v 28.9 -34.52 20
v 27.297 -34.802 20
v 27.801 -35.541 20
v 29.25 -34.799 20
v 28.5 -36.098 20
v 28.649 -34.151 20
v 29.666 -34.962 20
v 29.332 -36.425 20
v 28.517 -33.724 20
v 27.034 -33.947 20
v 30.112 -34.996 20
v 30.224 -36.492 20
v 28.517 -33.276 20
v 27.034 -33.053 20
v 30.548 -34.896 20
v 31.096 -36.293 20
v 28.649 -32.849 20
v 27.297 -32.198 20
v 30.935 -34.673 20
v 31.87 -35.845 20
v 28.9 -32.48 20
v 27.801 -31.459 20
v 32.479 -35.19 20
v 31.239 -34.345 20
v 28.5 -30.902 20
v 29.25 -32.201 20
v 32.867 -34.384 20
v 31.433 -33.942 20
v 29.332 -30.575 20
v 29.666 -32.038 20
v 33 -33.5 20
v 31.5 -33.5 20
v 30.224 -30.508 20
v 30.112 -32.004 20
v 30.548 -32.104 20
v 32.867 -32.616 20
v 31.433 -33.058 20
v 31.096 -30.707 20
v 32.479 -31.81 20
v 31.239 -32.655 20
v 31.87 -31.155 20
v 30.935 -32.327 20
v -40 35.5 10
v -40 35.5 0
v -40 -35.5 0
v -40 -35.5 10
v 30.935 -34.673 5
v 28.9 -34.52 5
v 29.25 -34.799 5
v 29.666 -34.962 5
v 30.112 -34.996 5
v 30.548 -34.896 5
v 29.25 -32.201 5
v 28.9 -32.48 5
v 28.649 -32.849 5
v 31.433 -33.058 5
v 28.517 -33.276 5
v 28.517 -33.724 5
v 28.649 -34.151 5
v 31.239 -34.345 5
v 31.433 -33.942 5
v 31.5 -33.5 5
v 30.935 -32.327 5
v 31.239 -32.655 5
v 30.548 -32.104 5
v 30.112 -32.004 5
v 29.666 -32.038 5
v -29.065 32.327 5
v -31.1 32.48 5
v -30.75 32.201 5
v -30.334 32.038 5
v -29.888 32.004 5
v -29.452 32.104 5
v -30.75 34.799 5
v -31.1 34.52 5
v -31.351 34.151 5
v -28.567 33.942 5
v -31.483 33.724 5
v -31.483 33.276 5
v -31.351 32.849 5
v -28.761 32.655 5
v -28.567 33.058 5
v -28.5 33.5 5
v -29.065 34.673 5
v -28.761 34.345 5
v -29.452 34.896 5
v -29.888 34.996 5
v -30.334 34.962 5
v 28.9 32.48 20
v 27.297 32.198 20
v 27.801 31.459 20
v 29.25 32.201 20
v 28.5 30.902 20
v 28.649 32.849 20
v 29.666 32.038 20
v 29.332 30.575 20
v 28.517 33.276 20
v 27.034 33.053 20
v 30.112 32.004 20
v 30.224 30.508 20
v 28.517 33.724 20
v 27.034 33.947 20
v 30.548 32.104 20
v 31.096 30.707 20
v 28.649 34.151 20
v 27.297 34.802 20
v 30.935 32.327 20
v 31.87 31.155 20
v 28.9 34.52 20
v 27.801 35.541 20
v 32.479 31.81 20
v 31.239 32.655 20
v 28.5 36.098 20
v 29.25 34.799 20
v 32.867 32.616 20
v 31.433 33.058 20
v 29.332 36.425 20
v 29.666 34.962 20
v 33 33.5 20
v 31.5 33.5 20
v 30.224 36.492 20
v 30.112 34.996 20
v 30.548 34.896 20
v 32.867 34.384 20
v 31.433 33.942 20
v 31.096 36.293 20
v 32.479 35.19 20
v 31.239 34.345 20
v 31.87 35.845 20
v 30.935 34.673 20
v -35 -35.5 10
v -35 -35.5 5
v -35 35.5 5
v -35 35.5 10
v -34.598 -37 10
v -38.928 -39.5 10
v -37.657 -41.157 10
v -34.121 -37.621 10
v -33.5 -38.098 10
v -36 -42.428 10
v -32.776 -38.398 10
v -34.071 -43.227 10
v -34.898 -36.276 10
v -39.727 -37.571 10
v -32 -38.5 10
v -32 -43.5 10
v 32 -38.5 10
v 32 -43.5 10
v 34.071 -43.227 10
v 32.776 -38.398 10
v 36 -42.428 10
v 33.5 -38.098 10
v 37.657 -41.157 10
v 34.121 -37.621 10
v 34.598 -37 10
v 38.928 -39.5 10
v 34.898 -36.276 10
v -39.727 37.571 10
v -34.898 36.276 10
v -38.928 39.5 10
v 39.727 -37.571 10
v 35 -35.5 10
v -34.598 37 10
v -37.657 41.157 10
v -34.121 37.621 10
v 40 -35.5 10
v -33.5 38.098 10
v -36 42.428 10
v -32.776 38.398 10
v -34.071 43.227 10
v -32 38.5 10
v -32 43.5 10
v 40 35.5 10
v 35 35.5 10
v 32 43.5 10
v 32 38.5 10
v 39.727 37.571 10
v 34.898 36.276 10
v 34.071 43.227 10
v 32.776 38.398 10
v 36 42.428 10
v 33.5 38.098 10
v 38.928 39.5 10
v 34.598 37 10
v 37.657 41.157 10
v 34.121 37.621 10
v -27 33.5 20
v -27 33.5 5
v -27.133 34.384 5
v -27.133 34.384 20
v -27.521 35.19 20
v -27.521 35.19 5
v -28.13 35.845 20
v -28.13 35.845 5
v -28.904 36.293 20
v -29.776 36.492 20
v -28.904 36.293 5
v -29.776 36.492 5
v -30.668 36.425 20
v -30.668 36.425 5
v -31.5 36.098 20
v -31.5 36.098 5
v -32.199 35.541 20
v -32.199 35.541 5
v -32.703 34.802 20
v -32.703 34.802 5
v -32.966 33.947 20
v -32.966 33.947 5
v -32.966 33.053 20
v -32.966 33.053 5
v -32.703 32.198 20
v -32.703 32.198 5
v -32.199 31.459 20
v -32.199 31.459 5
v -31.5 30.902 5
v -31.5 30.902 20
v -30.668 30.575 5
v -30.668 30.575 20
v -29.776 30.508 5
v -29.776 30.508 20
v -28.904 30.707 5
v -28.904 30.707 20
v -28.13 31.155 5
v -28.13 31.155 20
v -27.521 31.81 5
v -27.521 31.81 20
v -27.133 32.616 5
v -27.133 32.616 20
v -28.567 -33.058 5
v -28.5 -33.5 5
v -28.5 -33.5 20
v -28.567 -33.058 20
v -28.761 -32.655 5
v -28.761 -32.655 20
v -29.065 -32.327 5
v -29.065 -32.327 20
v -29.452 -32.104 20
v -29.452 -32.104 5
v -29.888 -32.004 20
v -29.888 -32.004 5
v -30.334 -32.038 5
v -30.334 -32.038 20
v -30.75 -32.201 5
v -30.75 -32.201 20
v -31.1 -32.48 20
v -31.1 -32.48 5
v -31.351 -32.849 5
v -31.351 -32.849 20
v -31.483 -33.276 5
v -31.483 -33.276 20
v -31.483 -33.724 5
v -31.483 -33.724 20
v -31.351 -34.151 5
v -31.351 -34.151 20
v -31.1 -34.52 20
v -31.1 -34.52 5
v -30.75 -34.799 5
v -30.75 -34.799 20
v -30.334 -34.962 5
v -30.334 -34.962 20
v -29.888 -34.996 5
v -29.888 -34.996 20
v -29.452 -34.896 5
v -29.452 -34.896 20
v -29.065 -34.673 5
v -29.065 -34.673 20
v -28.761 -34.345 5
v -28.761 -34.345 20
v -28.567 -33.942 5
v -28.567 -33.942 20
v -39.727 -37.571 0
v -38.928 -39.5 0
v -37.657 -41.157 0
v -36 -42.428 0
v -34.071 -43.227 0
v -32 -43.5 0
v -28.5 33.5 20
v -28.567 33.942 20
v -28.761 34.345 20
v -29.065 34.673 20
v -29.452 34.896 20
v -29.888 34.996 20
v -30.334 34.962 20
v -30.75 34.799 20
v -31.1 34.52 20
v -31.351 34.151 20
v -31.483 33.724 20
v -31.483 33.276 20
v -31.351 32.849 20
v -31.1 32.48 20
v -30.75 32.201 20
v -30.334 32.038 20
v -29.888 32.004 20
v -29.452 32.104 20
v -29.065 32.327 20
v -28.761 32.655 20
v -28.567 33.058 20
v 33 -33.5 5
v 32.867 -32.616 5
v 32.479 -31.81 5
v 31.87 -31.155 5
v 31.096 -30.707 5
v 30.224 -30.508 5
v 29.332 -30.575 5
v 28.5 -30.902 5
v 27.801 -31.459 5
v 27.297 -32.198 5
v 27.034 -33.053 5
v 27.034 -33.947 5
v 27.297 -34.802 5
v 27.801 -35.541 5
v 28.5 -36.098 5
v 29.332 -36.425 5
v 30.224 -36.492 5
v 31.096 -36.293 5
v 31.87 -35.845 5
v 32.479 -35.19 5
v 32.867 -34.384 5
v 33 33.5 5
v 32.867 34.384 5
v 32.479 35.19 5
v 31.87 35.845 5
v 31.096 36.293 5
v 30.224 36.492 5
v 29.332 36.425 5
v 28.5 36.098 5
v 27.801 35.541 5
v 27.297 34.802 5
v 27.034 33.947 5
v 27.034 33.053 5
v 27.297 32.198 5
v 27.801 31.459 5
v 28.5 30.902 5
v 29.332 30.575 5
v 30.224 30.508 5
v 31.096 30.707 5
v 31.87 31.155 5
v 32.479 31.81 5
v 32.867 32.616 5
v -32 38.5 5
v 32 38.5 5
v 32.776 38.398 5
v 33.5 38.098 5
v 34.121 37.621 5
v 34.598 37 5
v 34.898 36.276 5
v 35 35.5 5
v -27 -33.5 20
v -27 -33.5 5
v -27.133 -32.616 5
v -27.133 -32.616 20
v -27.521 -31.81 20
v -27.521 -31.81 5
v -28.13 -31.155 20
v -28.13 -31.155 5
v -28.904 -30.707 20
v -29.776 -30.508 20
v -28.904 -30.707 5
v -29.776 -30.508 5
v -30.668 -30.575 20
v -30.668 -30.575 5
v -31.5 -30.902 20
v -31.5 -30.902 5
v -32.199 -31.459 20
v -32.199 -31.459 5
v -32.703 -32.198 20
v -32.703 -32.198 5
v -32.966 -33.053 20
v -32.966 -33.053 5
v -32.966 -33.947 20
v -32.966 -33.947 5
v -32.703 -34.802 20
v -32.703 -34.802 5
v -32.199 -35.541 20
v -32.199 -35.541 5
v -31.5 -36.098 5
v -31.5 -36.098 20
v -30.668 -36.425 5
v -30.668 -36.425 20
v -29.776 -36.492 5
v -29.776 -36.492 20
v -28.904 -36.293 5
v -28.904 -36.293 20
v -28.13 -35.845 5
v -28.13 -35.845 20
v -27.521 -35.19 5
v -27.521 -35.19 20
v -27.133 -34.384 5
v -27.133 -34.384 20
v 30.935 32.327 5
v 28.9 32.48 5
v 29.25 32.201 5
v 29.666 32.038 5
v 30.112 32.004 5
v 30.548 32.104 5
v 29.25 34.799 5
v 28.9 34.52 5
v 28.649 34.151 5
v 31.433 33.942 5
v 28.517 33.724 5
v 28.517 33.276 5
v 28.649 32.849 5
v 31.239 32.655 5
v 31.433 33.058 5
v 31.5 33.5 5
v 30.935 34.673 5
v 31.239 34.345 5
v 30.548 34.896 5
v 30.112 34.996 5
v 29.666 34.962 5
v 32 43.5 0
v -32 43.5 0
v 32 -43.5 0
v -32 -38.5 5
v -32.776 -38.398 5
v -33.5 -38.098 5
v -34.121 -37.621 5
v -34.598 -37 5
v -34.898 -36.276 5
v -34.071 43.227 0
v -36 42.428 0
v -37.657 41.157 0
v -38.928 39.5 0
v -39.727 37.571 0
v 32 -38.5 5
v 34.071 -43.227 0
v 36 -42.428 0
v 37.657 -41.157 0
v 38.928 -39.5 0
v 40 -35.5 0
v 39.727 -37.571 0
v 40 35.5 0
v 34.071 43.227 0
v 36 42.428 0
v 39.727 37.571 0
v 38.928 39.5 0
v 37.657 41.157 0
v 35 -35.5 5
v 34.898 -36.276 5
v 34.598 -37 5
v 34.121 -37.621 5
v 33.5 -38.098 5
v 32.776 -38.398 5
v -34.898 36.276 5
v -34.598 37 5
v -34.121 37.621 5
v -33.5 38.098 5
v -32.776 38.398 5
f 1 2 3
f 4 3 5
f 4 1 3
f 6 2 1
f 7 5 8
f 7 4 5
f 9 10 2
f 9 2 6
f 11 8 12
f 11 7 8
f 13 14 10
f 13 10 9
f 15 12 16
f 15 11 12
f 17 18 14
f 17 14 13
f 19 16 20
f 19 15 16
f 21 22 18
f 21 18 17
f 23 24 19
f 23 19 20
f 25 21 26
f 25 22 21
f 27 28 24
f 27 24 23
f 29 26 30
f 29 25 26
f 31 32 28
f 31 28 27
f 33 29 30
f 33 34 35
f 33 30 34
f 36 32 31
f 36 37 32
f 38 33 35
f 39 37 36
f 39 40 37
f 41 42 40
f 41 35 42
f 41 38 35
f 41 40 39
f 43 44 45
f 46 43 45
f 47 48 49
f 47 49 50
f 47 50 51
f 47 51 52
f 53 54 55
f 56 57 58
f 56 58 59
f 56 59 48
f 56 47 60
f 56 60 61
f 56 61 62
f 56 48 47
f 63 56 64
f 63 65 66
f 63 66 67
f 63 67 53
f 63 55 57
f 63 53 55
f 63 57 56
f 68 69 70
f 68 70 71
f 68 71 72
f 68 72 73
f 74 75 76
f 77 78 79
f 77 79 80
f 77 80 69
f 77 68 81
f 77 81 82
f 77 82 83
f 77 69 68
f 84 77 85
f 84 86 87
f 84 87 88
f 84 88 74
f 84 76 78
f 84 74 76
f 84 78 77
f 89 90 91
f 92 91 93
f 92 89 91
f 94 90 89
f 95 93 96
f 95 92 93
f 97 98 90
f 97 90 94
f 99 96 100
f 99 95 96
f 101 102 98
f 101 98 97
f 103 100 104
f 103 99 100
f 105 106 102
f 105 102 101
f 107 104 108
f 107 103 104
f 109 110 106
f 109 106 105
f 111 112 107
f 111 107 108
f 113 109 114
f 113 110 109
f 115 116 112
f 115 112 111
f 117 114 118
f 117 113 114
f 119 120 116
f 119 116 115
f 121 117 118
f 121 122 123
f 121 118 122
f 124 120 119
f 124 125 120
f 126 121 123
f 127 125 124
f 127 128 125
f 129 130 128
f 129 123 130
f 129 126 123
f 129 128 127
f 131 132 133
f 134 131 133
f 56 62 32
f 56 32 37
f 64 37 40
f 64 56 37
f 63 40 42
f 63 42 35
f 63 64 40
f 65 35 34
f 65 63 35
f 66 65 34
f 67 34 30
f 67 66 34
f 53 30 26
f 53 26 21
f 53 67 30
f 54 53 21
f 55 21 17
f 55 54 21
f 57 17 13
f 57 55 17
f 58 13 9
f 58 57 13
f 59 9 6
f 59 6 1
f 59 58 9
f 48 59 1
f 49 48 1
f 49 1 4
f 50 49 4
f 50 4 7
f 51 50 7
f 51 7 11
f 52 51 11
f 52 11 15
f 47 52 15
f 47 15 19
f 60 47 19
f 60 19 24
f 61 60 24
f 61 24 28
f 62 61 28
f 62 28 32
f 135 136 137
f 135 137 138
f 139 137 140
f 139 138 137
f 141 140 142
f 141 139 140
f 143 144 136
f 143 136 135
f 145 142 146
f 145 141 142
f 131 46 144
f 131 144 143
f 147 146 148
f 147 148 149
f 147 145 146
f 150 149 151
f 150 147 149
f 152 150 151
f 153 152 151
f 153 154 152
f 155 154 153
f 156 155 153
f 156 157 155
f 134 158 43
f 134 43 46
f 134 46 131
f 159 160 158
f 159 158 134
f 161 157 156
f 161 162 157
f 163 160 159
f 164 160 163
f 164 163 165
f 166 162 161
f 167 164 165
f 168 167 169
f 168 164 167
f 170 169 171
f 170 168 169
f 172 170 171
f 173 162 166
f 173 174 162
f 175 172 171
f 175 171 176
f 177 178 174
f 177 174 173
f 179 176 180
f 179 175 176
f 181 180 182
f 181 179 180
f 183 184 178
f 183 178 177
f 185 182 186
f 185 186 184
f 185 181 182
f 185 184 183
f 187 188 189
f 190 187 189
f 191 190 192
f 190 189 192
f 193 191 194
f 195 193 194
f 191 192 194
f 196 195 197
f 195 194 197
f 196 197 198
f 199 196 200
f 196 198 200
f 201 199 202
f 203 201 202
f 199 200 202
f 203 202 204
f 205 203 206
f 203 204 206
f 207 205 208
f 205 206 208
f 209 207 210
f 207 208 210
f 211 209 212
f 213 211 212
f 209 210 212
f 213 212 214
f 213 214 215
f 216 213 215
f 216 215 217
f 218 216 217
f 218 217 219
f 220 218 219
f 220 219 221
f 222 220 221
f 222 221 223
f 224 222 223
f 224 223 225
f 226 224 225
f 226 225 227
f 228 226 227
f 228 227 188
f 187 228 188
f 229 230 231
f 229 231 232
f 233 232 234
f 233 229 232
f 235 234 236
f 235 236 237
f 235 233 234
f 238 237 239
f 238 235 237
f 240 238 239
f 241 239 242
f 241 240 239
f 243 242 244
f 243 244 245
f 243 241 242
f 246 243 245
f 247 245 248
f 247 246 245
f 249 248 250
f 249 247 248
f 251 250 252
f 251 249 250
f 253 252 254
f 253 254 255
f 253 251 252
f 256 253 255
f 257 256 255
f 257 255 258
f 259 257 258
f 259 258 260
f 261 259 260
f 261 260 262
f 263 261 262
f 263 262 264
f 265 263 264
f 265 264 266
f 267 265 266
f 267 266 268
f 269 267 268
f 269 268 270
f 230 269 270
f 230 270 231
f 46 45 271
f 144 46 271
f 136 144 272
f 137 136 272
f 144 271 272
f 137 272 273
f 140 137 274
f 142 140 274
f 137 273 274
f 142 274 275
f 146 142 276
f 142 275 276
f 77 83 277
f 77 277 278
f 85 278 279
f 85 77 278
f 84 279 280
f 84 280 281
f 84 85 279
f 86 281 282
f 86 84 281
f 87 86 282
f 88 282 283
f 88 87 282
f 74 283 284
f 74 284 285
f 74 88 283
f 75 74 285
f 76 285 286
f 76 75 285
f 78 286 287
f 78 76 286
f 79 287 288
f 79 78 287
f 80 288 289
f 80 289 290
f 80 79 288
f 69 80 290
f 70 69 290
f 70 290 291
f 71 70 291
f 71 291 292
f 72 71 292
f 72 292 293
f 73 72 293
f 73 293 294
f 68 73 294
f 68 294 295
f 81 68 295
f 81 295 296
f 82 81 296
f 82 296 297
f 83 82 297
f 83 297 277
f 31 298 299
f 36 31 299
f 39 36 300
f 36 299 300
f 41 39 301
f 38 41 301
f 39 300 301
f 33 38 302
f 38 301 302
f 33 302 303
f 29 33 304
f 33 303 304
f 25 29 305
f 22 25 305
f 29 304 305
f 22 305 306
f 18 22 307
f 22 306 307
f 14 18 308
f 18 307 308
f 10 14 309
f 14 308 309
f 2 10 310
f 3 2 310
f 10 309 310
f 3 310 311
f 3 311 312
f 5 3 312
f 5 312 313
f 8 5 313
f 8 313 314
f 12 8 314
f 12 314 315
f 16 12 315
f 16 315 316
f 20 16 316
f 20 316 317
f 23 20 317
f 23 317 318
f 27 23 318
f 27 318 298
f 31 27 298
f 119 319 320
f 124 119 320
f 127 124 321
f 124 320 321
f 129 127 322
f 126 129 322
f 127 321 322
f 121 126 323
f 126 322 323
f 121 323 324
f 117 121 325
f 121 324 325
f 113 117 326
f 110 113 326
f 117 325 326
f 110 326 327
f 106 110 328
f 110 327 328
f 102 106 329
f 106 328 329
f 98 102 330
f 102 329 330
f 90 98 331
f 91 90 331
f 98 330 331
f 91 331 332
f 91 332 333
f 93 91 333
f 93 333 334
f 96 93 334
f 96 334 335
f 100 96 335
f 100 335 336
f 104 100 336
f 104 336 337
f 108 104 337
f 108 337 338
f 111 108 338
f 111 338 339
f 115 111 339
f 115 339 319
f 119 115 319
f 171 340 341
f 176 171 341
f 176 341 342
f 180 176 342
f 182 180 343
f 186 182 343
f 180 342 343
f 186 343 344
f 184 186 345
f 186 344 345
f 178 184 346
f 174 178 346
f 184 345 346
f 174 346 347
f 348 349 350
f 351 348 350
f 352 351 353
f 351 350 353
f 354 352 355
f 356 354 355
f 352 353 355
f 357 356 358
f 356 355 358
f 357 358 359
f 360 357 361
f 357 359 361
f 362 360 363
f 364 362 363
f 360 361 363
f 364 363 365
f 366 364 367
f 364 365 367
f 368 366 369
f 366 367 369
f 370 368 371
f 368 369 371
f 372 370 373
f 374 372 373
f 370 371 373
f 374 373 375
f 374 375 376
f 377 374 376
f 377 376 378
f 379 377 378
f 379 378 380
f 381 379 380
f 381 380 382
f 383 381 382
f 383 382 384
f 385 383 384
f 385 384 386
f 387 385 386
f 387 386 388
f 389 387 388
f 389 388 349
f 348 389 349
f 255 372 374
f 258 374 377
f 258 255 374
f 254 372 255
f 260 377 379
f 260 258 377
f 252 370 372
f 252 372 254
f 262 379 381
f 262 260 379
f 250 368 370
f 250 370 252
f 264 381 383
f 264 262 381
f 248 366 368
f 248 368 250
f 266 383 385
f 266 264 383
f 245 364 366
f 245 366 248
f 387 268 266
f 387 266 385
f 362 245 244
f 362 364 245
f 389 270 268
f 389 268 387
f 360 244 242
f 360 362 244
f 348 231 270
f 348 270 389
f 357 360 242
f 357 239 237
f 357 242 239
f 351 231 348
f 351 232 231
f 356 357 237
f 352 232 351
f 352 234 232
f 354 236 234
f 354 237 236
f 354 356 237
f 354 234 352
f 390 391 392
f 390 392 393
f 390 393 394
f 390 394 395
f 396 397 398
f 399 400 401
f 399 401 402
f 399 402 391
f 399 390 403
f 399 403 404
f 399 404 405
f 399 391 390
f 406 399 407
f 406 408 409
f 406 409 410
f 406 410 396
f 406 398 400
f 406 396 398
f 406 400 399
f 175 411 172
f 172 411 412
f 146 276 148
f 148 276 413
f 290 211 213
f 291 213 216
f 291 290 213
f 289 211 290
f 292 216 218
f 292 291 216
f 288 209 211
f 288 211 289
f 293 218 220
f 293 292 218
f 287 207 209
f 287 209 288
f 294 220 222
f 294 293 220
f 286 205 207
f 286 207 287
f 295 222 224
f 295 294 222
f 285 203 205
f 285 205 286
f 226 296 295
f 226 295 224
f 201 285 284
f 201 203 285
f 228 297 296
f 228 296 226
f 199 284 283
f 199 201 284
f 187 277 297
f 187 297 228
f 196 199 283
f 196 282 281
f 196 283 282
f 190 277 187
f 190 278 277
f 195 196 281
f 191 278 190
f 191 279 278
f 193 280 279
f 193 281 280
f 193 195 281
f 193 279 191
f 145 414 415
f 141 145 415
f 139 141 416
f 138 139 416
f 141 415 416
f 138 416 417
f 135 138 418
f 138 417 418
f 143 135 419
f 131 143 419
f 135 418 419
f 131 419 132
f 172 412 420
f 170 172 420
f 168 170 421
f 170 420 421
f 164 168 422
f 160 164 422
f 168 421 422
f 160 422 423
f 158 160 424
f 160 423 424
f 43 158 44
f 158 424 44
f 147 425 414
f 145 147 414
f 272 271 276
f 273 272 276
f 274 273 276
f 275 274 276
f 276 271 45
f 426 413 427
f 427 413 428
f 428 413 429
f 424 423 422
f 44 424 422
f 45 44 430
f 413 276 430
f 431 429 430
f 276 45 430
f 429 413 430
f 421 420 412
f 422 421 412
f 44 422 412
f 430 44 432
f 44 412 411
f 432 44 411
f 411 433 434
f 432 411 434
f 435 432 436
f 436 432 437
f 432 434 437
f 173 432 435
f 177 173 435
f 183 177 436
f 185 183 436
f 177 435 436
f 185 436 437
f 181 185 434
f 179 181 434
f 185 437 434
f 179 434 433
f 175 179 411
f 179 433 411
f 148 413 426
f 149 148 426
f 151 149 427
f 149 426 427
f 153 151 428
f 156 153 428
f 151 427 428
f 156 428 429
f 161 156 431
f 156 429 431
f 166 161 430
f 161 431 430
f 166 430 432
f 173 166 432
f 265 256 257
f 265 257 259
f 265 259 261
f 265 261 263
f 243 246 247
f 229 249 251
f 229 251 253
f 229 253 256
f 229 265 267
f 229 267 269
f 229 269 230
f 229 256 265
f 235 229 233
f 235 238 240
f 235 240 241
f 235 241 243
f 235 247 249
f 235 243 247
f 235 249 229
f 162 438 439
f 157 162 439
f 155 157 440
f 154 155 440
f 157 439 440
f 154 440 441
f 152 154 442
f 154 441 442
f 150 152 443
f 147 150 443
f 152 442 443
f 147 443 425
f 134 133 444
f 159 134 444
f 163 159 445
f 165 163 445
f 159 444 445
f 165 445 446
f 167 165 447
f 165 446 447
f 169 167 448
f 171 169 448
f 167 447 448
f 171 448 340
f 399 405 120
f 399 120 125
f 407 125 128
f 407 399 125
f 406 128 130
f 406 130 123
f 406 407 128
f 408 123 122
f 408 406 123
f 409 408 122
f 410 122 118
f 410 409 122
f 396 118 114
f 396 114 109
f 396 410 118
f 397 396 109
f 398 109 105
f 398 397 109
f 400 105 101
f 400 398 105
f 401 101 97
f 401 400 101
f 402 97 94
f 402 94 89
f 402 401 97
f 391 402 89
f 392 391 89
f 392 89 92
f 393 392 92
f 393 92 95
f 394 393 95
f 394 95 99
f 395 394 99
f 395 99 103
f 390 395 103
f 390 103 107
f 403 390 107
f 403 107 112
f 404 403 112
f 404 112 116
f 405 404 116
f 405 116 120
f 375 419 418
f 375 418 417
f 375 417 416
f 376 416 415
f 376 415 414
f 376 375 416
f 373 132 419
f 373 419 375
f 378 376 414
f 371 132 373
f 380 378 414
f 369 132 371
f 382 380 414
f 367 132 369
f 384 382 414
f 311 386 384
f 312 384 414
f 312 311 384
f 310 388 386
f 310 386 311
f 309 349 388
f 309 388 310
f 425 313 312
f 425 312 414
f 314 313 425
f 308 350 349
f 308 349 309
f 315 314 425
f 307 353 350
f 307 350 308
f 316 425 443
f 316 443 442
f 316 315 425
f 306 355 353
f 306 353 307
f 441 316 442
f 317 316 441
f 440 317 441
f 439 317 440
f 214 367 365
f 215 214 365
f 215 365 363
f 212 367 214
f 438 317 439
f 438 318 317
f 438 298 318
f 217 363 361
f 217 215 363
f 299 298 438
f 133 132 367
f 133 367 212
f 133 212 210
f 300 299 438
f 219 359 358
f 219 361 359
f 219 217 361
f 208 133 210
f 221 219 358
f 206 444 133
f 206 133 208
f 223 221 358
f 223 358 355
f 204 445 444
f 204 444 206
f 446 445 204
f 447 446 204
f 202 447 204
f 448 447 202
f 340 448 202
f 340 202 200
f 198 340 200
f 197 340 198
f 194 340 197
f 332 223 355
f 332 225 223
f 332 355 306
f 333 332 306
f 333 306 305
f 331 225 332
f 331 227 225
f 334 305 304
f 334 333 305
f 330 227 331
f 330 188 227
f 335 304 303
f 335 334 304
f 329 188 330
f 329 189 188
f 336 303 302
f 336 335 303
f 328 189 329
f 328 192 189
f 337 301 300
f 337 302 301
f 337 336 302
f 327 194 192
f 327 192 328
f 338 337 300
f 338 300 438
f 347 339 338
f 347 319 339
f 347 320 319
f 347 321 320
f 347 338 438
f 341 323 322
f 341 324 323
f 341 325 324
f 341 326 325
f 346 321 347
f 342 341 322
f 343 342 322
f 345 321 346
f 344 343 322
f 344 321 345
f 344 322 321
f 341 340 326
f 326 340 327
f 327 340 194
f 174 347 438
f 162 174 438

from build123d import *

# Parameters (mm, degrees)
F1_DEPTH = 10
F0_R     = 3
F0_R_2   = 1.5
F2_DEPTH = 5
F3_DEPTH = 20


with BuildPart() as f1:
    # F0 (on Top) → F1 (new body)
    with BuildSketch(Plane.XY):
        with BuildLine():
            ThreePointArc((40, 35.5), (37.656854, 41.156854), (32, 43.5))
            Line((32, 43.5), (-32, 43.5))
            ThreePointArc((-32, 43.5), (-37.656854, 41.156854), (-40, 35.5))
            Line((-40, 35.5), (-40, -35.5))
            ThreePointArc((-40, -35.5), (-37.656854, -41.156854), (-32, -43.5))
            Line((-32, -43.5), (32, -43.5))
            ThreePointArc((32, -43.5), (37.656854, -41.156854), (40, -35.5))
            Line((40, -35.5), (40, 35.5))
        make_face()
        with BuildLine():
            Line((-32, 38.5), (32, 38.5))
            ThreePointArc((32, 38.5), (34.12132, 37.62132), (35, 35.5))
            Line((35, 35.5), (35, -35.5))
            ThreePointArc((35, -35.5), (34.12132, -37.62132), (32, -38.5))
            Line((32, -38.5), (-32, -38.5))
            ThreePointArc((-32, -38.5), (-34.12132, -37.62132), (-35, -35.5))
            Line((-35, -35.5), (-35, 35.5))
            ThreePointArc((-35, 35.5), (-34.12132, 37.62132), (-32, 38.5))
        make_face(mode=Mode.SUBTRACT)
    extrude(amount=F1_DEPTH)

    # F0 (on Top) → F2 (join)
    with BuildSketch(Plane.XY):
        with BuildLine():
            ThreePointArc((35, 35.5), (34.12132, 37.62132), (32, 38.5))
            Line((32, 38.5), (-32, 38.5))
            ThreePointArc((-32, 38.5), (-34.12132, 37.62132), (-35, 35.5))
            Line((-35, 35.5), (-35, -35.5))
            ThreePointArc((-35, -35.5), (-34.12132, -37.62132), (-32, -38.5))
            Line((-32, -38.5), (32, -38.5))
            ThreePointArc((32, -38.5), (34.12132, -37.62132), (35, -35.5))
            Line((35, -35.5), (35, 35.5))
        make_face()
        with Locations((-30, -33.5)):
            Circle(F0_R, mode=Mode.SUBTRACT)
        with Locations((30, -33.5)):
            Circle(F0_R, mode=Mode.SUBTRACT)
        with Locations((-30, 33.5)):
            Circle(F0_R, mode=Mode.SUBTRACT)
        with Locations((30, 33.5)):
            Circle(F0_R, mode=Mode.SUBTRACT)
        with Locations((-30, -33.5)):
            Circle(F0_R_2)
        with Locations((30, -33.5)):
            Circle(F0_R_2)
        with Locations((30, 33.5)):
            Circle(F0_R_2)
        with Locations((-30, 33.5)):
            Circle(F0_R_2)
    extrude(amount=F2_DEPTH)

    # F0 (on Top) → F3 (join)
    with BuildSketch(Plane.XY):
        with Locations((-30, 33.5)):
            Circle(F0_R)
        with Locations((-30, 33.5)):
            Circle(F0_R_2, mode=Mode.SUBTRACT)
        with Locations((30, 33.5)):
            Circle(F0_R)
        with Locations((30, 33.5)):
            Circle(F0_R_2, mode=Mode.SUBTRACT)
        with Locations((30, -33.5)):
            Circle(F0_R)
        with Locations((30, -33.5)):
            Circle(F0_R_2, mode=Mode.SUBTRACT)
        with Locations((-30, -33.5)):
            Circle(F0_R)
        with Locations((-30, -33.5)):
            Circle(F0_R_2, mode=Mode.SUBTRACT)
    extrude(amount=F3_DEPTH)


solid = f1.part
